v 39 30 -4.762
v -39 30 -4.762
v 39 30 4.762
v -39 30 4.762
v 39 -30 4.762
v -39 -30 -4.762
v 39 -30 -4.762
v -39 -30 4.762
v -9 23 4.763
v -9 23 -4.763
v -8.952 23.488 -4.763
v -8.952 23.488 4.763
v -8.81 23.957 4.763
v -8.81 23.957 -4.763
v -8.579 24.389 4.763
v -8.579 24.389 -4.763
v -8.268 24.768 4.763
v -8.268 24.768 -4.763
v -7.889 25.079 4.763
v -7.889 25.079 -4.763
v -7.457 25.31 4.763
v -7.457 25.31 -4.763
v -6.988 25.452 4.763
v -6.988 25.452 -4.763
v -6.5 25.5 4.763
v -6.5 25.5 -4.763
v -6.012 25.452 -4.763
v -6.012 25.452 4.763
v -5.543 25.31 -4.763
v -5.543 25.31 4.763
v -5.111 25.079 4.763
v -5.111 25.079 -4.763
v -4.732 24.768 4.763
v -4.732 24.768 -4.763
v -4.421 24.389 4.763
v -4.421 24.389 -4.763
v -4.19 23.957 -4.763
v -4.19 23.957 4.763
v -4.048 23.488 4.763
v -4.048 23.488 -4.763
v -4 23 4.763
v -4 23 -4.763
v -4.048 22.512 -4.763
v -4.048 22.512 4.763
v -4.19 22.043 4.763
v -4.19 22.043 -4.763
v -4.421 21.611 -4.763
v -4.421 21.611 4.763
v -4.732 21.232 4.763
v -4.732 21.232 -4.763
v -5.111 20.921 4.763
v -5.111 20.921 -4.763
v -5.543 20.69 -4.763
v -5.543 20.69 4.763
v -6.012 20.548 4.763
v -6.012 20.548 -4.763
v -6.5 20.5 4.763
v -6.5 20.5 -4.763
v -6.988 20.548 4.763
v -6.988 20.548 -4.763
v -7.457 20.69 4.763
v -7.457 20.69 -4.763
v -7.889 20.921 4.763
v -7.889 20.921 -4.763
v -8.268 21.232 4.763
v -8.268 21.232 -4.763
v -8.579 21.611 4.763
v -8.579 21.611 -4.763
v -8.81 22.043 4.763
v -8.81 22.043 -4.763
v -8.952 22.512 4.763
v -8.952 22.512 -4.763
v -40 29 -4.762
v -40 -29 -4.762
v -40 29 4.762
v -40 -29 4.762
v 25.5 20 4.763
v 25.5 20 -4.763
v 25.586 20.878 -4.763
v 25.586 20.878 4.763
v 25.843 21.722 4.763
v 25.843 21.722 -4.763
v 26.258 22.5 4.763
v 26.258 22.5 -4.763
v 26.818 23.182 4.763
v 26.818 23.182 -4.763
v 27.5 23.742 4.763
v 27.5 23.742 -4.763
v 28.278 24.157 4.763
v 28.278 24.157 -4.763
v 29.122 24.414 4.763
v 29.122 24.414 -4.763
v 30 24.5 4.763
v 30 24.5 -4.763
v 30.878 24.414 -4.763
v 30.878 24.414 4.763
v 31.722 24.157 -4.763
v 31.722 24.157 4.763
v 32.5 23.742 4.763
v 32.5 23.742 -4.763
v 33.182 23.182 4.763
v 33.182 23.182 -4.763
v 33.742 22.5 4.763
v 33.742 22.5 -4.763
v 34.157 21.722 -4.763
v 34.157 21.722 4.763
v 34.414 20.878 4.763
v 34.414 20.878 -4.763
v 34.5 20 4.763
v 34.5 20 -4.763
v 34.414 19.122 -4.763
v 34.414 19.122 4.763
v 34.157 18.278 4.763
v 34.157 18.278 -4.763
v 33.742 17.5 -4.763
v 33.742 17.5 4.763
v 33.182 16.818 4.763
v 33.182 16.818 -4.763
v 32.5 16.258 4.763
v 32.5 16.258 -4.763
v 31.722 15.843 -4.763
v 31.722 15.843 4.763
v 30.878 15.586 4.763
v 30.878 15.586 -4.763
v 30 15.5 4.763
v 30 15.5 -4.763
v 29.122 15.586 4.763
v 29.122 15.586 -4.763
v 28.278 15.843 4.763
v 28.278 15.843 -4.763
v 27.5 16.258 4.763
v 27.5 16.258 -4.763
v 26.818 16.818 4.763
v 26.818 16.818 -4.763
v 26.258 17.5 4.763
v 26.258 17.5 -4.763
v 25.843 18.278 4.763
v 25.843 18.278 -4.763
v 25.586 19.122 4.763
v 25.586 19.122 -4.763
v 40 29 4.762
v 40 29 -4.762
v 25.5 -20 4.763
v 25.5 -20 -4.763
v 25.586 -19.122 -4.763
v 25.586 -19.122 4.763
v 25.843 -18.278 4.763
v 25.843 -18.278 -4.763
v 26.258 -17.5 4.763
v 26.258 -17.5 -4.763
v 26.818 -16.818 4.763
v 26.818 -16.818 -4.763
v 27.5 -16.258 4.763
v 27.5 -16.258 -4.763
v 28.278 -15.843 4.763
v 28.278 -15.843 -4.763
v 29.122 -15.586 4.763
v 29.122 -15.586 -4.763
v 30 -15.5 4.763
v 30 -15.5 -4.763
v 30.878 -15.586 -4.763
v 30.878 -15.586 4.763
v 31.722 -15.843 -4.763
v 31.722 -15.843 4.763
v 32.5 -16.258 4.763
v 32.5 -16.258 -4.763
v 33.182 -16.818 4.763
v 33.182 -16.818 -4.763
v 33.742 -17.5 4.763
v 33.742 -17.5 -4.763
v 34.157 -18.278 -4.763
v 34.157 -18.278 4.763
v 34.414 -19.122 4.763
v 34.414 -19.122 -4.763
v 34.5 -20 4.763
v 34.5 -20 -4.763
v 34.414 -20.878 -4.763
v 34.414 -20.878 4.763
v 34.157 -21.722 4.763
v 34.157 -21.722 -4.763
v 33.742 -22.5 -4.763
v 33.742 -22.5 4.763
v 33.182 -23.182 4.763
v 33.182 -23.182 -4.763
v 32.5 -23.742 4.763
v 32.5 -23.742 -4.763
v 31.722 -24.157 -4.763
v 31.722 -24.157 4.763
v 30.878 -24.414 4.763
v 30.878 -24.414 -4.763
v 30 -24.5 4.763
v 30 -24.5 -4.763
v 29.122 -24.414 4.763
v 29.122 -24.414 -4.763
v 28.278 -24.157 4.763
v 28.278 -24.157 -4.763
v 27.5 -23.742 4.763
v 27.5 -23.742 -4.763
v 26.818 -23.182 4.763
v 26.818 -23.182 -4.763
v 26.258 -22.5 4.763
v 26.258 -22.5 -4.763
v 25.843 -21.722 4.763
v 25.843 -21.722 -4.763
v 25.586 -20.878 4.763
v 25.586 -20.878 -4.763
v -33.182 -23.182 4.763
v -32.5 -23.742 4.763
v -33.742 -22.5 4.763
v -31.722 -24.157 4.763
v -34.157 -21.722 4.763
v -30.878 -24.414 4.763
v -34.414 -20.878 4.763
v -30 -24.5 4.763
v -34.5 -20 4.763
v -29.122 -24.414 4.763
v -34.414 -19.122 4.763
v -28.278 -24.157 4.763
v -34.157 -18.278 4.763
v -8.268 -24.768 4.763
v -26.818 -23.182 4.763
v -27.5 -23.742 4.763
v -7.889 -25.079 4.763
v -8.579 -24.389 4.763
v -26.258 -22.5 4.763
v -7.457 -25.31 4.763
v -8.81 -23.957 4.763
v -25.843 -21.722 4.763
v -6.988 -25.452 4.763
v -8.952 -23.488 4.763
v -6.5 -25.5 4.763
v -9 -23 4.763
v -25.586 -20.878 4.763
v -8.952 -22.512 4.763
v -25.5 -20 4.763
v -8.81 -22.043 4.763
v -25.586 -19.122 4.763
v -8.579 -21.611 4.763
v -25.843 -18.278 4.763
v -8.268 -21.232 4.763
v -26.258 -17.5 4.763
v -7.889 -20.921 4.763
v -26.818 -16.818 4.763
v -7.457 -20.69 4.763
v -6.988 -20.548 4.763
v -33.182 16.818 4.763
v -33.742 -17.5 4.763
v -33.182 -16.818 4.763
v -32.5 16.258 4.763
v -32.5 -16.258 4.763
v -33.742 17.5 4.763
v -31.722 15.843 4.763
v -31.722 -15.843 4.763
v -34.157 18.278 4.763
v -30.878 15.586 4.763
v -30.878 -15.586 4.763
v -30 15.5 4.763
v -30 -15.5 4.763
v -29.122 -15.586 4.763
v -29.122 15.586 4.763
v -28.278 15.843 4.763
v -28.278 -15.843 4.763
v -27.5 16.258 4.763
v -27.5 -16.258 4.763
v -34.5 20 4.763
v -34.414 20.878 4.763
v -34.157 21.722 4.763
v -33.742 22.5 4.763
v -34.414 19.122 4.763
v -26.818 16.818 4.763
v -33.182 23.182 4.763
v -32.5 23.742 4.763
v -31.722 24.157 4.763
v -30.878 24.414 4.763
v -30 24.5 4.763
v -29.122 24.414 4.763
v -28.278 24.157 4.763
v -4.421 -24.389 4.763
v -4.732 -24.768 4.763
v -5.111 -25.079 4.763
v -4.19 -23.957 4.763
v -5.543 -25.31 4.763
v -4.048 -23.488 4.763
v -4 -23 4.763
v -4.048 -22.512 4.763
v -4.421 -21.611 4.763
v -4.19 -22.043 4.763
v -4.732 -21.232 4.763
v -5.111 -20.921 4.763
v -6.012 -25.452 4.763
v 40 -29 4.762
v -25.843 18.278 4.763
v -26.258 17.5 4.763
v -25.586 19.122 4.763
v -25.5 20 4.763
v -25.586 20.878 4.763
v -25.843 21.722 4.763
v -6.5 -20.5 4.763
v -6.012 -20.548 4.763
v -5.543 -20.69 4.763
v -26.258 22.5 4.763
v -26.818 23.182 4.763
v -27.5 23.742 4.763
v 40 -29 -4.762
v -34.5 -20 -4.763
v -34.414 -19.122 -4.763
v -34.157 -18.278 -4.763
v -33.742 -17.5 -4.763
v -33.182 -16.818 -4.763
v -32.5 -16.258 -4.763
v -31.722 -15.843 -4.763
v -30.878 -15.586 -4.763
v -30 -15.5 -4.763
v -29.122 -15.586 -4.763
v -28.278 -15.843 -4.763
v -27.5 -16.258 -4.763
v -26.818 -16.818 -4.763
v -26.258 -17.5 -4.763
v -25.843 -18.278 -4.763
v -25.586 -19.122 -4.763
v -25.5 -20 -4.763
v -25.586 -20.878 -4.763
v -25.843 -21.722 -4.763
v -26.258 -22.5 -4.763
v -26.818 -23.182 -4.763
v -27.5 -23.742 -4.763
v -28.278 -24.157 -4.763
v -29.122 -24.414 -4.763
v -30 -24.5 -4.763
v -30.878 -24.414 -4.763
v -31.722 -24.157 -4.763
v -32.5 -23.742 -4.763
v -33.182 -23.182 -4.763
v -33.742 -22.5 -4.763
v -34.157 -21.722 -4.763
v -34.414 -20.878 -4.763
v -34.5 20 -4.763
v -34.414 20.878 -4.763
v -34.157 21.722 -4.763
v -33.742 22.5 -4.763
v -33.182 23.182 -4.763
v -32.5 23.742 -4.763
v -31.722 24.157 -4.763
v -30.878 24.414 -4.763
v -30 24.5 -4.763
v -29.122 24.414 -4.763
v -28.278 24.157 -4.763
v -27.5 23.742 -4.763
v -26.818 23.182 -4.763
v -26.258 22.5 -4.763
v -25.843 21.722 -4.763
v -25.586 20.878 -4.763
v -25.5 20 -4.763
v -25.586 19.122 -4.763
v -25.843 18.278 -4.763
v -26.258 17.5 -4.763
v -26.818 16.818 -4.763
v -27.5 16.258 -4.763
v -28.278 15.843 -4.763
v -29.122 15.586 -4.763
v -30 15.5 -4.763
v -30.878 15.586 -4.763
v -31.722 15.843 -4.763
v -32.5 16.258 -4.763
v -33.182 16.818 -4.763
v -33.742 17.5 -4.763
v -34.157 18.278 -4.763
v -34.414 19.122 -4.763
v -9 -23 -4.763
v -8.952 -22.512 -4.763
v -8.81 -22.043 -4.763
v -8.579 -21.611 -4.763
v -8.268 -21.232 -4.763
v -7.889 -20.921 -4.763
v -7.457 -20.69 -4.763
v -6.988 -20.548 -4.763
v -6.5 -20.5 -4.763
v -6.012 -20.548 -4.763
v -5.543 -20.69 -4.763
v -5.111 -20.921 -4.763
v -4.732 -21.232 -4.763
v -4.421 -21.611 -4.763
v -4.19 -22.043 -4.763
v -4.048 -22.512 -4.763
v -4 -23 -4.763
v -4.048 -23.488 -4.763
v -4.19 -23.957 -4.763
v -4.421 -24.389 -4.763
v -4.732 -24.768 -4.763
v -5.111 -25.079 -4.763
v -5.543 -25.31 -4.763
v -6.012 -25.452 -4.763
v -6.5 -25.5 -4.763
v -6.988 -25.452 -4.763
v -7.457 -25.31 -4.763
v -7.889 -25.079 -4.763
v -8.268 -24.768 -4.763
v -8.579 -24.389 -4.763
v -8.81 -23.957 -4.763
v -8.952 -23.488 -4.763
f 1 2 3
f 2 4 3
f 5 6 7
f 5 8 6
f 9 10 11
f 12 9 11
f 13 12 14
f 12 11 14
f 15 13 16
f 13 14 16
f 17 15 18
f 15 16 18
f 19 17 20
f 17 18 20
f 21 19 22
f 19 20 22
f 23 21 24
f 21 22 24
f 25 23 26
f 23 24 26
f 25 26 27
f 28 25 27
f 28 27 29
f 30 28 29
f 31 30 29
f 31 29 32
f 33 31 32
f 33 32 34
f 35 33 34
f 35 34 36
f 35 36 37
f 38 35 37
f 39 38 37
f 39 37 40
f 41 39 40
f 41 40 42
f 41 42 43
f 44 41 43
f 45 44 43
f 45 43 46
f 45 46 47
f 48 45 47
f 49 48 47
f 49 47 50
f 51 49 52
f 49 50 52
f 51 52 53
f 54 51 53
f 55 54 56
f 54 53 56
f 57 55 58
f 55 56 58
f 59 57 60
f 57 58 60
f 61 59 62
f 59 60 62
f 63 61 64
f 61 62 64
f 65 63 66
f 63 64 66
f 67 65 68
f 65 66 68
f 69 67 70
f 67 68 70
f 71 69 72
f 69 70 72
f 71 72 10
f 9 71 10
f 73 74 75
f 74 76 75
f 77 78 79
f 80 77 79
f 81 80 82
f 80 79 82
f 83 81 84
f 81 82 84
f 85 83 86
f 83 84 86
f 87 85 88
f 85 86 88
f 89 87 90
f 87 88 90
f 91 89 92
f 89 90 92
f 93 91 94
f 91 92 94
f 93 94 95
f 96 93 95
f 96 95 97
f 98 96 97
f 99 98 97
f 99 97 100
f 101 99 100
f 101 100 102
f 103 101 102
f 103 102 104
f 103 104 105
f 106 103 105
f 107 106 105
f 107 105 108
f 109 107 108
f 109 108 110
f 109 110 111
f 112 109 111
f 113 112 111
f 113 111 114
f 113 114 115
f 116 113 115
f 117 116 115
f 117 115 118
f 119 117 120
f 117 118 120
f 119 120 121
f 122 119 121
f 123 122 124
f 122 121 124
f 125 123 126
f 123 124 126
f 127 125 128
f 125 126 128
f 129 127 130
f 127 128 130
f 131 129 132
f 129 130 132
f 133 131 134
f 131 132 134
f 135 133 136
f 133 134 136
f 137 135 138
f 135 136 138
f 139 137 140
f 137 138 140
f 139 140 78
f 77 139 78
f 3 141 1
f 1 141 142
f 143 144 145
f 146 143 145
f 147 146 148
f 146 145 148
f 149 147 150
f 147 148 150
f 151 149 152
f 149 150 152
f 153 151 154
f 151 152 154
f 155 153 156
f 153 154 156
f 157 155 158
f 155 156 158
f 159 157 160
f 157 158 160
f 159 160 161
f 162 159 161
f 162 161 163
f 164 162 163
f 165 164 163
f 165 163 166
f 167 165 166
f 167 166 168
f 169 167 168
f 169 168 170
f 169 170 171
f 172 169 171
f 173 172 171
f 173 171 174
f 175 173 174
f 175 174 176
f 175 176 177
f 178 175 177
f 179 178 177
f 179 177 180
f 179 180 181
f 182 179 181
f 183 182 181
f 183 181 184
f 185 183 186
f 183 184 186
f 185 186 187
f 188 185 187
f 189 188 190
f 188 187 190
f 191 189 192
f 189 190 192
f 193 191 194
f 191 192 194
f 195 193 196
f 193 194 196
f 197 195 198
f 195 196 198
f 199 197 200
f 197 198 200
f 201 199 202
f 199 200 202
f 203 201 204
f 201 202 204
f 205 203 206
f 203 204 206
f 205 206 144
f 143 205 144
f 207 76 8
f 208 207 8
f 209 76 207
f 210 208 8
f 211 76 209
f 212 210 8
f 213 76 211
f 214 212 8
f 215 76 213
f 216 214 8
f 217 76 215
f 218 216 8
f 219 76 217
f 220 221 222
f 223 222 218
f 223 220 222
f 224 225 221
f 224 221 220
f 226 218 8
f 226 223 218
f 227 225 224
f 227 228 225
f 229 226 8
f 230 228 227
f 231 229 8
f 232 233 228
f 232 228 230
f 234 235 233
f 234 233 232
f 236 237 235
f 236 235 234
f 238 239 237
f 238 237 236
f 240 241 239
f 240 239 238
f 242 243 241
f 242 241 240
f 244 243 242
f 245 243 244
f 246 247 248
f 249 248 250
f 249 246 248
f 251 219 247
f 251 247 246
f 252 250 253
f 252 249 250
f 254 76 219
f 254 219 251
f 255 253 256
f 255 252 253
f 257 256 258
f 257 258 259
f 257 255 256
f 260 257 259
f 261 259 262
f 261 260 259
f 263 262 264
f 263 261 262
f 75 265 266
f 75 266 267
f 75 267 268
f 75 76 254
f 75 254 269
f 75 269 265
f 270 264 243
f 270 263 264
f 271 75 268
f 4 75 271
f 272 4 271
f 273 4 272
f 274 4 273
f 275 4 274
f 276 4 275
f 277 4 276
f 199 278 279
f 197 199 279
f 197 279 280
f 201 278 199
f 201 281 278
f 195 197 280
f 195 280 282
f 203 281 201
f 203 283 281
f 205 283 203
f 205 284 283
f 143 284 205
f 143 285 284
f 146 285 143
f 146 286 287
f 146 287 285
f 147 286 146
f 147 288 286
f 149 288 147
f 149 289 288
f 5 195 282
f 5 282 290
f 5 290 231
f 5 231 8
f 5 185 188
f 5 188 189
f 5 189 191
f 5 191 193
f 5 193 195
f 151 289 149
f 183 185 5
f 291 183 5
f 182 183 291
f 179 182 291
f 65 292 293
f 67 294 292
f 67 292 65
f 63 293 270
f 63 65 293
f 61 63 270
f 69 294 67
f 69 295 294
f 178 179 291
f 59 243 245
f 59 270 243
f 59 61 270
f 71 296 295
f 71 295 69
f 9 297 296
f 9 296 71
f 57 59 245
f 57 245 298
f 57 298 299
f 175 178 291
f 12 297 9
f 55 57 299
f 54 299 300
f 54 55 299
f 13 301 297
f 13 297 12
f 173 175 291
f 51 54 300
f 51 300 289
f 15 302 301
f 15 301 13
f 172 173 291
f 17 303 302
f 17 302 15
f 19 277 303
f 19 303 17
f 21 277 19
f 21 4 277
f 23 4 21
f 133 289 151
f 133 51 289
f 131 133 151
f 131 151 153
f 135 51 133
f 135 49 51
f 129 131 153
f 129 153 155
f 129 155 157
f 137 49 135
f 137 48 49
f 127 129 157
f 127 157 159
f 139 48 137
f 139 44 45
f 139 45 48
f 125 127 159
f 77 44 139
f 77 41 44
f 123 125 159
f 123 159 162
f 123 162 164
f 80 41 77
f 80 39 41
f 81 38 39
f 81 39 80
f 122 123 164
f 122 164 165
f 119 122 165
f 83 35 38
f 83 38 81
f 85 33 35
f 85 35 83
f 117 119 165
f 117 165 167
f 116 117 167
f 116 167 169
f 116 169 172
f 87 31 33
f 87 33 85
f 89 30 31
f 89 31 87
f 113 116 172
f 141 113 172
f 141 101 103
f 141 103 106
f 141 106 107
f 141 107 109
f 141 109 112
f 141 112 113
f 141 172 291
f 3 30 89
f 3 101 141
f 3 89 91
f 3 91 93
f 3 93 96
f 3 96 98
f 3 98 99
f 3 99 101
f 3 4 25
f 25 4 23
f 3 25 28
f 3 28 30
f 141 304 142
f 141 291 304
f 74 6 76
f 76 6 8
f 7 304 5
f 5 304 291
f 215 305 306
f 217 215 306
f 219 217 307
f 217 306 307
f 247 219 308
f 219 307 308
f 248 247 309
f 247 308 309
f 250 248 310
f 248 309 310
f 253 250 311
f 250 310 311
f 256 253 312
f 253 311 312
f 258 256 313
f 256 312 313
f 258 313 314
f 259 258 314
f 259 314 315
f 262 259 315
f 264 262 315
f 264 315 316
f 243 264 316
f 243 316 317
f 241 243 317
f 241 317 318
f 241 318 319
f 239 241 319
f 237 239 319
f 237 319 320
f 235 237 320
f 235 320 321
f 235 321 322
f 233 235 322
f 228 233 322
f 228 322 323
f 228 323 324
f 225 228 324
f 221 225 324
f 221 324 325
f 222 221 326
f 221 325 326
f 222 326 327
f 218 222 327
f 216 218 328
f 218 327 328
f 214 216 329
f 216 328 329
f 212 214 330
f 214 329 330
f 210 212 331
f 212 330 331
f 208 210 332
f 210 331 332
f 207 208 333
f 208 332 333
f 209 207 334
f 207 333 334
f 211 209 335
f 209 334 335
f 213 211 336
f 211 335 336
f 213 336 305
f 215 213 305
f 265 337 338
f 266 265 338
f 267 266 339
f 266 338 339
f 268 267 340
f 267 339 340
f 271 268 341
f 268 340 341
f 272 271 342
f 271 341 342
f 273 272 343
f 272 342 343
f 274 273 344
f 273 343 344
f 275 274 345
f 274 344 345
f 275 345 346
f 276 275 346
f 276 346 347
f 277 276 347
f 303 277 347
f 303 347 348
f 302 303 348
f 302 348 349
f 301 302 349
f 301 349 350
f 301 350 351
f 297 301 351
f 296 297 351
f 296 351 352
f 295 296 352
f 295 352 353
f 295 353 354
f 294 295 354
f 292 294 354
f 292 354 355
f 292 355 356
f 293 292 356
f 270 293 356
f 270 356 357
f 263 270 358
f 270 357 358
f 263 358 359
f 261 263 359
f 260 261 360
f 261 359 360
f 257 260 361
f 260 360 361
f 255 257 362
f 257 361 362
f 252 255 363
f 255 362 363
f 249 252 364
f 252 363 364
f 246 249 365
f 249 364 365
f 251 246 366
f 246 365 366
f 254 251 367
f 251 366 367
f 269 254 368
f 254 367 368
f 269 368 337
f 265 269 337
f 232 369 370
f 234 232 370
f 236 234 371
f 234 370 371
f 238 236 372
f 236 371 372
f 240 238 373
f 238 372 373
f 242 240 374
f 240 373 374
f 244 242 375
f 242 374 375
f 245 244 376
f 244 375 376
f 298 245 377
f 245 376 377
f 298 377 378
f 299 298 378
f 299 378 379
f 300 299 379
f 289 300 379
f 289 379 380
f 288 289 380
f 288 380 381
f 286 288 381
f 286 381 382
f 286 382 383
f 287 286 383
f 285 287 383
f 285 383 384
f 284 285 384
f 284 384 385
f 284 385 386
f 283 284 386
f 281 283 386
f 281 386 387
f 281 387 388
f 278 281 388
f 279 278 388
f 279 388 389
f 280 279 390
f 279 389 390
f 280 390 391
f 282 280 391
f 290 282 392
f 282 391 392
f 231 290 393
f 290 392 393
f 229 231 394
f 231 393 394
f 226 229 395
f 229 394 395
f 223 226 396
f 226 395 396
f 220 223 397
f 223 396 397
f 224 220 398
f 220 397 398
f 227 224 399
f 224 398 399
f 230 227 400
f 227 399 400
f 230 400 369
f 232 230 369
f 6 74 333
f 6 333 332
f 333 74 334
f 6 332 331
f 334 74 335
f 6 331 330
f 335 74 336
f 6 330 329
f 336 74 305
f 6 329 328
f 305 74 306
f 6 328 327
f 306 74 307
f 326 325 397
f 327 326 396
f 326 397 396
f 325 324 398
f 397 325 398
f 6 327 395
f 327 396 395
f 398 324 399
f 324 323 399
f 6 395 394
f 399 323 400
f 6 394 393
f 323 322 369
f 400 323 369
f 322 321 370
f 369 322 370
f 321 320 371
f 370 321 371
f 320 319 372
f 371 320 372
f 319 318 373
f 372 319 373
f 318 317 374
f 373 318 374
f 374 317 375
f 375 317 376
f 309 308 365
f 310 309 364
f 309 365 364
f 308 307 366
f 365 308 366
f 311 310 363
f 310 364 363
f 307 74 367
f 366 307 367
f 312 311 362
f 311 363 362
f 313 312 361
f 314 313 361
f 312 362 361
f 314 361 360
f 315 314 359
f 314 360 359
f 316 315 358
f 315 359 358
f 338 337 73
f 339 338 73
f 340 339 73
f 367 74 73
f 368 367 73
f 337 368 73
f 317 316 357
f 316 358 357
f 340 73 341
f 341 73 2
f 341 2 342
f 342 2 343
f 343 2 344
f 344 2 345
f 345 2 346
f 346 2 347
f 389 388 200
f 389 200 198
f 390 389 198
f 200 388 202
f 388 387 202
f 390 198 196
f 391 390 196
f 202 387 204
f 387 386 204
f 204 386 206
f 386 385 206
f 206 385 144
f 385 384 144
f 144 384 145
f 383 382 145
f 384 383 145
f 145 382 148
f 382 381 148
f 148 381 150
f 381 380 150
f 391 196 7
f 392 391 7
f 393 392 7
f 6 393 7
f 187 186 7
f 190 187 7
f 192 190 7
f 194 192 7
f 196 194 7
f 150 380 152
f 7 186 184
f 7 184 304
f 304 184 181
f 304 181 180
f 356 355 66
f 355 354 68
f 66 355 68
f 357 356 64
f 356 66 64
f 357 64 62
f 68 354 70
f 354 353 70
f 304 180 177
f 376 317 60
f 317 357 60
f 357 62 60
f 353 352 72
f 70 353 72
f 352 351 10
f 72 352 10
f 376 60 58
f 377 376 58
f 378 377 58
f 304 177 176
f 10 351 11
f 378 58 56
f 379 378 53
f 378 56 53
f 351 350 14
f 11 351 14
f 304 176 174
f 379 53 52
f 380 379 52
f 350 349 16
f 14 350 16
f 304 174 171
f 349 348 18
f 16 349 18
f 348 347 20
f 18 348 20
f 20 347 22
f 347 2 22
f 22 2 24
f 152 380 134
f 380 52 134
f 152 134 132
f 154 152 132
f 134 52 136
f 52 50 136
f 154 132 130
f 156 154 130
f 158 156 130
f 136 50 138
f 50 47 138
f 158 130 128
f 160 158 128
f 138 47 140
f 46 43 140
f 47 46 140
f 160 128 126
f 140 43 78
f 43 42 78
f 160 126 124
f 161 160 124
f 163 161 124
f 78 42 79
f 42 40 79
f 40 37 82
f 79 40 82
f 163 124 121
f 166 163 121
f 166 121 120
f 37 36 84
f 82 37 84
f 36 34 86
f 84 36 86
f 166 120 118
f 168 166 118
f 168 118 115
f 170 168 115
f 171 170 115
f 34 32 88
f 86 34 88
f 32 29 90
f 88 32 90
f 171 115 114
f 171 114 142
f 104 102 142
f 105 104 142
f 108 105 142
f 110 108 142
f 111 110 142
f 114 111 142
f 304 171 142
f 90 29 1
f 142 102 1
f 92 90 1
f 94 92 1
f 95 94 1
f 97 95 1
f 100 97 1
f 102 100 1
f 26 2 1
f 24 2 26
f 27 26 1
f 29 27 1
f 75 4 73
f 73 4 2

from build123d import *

# Parameters (mm, degrees)
SKETCH1_W             = 80
SKETCH1_H             = 60
BOSS_EXTRUDE1_DEPTH   = 4.7625
M8_CLEARANCE_HOLE1_D  = 9
M6X1_0_TAPPED_HOLE2_D = 5
CHAMFER1_SIZE         = 1


with BuildPart() as part:
    # Sketch1 → Boss-Extrude1 (new, symmetric)
    with BuildSketch(Plane.XY):
        Rectangle(SKETCH1_W, SKETCH1_H)
    extrude(amount=BOSS_EXTRUDE1_DEPTH, both=True)

    # M8 Clearance Hole1 (through all)
    with Locations(Plane.XY.offset(4.7625)):
        with Locations((-30, 20), (30, 20), (30, -20), (-30, -20)):
            Hole(M8_CLEARANCE_HOLE1_D / 2)

    # M6x1.0 Tapped Hole2 (through all)
    with Locations(Plane.XY.offset(4.7625)):
        with Locations((-6.5, 23), (-6.5, -23)):
            Hole(M6X1_0_TAPPED_HOLE2_D / 2)

    # Chamfer1
    chamfer1_edges = [part.edges().sort_by_distance(p)[0] for p in [
        (-40, 30, 0),
        (40, 30, 0),
        (40, -30, 0),
        (-40, -30, 0),
    ]]
    chamfer(chamfer1_edges, length=CHAMFER1_SIZE)


solid = part.part
